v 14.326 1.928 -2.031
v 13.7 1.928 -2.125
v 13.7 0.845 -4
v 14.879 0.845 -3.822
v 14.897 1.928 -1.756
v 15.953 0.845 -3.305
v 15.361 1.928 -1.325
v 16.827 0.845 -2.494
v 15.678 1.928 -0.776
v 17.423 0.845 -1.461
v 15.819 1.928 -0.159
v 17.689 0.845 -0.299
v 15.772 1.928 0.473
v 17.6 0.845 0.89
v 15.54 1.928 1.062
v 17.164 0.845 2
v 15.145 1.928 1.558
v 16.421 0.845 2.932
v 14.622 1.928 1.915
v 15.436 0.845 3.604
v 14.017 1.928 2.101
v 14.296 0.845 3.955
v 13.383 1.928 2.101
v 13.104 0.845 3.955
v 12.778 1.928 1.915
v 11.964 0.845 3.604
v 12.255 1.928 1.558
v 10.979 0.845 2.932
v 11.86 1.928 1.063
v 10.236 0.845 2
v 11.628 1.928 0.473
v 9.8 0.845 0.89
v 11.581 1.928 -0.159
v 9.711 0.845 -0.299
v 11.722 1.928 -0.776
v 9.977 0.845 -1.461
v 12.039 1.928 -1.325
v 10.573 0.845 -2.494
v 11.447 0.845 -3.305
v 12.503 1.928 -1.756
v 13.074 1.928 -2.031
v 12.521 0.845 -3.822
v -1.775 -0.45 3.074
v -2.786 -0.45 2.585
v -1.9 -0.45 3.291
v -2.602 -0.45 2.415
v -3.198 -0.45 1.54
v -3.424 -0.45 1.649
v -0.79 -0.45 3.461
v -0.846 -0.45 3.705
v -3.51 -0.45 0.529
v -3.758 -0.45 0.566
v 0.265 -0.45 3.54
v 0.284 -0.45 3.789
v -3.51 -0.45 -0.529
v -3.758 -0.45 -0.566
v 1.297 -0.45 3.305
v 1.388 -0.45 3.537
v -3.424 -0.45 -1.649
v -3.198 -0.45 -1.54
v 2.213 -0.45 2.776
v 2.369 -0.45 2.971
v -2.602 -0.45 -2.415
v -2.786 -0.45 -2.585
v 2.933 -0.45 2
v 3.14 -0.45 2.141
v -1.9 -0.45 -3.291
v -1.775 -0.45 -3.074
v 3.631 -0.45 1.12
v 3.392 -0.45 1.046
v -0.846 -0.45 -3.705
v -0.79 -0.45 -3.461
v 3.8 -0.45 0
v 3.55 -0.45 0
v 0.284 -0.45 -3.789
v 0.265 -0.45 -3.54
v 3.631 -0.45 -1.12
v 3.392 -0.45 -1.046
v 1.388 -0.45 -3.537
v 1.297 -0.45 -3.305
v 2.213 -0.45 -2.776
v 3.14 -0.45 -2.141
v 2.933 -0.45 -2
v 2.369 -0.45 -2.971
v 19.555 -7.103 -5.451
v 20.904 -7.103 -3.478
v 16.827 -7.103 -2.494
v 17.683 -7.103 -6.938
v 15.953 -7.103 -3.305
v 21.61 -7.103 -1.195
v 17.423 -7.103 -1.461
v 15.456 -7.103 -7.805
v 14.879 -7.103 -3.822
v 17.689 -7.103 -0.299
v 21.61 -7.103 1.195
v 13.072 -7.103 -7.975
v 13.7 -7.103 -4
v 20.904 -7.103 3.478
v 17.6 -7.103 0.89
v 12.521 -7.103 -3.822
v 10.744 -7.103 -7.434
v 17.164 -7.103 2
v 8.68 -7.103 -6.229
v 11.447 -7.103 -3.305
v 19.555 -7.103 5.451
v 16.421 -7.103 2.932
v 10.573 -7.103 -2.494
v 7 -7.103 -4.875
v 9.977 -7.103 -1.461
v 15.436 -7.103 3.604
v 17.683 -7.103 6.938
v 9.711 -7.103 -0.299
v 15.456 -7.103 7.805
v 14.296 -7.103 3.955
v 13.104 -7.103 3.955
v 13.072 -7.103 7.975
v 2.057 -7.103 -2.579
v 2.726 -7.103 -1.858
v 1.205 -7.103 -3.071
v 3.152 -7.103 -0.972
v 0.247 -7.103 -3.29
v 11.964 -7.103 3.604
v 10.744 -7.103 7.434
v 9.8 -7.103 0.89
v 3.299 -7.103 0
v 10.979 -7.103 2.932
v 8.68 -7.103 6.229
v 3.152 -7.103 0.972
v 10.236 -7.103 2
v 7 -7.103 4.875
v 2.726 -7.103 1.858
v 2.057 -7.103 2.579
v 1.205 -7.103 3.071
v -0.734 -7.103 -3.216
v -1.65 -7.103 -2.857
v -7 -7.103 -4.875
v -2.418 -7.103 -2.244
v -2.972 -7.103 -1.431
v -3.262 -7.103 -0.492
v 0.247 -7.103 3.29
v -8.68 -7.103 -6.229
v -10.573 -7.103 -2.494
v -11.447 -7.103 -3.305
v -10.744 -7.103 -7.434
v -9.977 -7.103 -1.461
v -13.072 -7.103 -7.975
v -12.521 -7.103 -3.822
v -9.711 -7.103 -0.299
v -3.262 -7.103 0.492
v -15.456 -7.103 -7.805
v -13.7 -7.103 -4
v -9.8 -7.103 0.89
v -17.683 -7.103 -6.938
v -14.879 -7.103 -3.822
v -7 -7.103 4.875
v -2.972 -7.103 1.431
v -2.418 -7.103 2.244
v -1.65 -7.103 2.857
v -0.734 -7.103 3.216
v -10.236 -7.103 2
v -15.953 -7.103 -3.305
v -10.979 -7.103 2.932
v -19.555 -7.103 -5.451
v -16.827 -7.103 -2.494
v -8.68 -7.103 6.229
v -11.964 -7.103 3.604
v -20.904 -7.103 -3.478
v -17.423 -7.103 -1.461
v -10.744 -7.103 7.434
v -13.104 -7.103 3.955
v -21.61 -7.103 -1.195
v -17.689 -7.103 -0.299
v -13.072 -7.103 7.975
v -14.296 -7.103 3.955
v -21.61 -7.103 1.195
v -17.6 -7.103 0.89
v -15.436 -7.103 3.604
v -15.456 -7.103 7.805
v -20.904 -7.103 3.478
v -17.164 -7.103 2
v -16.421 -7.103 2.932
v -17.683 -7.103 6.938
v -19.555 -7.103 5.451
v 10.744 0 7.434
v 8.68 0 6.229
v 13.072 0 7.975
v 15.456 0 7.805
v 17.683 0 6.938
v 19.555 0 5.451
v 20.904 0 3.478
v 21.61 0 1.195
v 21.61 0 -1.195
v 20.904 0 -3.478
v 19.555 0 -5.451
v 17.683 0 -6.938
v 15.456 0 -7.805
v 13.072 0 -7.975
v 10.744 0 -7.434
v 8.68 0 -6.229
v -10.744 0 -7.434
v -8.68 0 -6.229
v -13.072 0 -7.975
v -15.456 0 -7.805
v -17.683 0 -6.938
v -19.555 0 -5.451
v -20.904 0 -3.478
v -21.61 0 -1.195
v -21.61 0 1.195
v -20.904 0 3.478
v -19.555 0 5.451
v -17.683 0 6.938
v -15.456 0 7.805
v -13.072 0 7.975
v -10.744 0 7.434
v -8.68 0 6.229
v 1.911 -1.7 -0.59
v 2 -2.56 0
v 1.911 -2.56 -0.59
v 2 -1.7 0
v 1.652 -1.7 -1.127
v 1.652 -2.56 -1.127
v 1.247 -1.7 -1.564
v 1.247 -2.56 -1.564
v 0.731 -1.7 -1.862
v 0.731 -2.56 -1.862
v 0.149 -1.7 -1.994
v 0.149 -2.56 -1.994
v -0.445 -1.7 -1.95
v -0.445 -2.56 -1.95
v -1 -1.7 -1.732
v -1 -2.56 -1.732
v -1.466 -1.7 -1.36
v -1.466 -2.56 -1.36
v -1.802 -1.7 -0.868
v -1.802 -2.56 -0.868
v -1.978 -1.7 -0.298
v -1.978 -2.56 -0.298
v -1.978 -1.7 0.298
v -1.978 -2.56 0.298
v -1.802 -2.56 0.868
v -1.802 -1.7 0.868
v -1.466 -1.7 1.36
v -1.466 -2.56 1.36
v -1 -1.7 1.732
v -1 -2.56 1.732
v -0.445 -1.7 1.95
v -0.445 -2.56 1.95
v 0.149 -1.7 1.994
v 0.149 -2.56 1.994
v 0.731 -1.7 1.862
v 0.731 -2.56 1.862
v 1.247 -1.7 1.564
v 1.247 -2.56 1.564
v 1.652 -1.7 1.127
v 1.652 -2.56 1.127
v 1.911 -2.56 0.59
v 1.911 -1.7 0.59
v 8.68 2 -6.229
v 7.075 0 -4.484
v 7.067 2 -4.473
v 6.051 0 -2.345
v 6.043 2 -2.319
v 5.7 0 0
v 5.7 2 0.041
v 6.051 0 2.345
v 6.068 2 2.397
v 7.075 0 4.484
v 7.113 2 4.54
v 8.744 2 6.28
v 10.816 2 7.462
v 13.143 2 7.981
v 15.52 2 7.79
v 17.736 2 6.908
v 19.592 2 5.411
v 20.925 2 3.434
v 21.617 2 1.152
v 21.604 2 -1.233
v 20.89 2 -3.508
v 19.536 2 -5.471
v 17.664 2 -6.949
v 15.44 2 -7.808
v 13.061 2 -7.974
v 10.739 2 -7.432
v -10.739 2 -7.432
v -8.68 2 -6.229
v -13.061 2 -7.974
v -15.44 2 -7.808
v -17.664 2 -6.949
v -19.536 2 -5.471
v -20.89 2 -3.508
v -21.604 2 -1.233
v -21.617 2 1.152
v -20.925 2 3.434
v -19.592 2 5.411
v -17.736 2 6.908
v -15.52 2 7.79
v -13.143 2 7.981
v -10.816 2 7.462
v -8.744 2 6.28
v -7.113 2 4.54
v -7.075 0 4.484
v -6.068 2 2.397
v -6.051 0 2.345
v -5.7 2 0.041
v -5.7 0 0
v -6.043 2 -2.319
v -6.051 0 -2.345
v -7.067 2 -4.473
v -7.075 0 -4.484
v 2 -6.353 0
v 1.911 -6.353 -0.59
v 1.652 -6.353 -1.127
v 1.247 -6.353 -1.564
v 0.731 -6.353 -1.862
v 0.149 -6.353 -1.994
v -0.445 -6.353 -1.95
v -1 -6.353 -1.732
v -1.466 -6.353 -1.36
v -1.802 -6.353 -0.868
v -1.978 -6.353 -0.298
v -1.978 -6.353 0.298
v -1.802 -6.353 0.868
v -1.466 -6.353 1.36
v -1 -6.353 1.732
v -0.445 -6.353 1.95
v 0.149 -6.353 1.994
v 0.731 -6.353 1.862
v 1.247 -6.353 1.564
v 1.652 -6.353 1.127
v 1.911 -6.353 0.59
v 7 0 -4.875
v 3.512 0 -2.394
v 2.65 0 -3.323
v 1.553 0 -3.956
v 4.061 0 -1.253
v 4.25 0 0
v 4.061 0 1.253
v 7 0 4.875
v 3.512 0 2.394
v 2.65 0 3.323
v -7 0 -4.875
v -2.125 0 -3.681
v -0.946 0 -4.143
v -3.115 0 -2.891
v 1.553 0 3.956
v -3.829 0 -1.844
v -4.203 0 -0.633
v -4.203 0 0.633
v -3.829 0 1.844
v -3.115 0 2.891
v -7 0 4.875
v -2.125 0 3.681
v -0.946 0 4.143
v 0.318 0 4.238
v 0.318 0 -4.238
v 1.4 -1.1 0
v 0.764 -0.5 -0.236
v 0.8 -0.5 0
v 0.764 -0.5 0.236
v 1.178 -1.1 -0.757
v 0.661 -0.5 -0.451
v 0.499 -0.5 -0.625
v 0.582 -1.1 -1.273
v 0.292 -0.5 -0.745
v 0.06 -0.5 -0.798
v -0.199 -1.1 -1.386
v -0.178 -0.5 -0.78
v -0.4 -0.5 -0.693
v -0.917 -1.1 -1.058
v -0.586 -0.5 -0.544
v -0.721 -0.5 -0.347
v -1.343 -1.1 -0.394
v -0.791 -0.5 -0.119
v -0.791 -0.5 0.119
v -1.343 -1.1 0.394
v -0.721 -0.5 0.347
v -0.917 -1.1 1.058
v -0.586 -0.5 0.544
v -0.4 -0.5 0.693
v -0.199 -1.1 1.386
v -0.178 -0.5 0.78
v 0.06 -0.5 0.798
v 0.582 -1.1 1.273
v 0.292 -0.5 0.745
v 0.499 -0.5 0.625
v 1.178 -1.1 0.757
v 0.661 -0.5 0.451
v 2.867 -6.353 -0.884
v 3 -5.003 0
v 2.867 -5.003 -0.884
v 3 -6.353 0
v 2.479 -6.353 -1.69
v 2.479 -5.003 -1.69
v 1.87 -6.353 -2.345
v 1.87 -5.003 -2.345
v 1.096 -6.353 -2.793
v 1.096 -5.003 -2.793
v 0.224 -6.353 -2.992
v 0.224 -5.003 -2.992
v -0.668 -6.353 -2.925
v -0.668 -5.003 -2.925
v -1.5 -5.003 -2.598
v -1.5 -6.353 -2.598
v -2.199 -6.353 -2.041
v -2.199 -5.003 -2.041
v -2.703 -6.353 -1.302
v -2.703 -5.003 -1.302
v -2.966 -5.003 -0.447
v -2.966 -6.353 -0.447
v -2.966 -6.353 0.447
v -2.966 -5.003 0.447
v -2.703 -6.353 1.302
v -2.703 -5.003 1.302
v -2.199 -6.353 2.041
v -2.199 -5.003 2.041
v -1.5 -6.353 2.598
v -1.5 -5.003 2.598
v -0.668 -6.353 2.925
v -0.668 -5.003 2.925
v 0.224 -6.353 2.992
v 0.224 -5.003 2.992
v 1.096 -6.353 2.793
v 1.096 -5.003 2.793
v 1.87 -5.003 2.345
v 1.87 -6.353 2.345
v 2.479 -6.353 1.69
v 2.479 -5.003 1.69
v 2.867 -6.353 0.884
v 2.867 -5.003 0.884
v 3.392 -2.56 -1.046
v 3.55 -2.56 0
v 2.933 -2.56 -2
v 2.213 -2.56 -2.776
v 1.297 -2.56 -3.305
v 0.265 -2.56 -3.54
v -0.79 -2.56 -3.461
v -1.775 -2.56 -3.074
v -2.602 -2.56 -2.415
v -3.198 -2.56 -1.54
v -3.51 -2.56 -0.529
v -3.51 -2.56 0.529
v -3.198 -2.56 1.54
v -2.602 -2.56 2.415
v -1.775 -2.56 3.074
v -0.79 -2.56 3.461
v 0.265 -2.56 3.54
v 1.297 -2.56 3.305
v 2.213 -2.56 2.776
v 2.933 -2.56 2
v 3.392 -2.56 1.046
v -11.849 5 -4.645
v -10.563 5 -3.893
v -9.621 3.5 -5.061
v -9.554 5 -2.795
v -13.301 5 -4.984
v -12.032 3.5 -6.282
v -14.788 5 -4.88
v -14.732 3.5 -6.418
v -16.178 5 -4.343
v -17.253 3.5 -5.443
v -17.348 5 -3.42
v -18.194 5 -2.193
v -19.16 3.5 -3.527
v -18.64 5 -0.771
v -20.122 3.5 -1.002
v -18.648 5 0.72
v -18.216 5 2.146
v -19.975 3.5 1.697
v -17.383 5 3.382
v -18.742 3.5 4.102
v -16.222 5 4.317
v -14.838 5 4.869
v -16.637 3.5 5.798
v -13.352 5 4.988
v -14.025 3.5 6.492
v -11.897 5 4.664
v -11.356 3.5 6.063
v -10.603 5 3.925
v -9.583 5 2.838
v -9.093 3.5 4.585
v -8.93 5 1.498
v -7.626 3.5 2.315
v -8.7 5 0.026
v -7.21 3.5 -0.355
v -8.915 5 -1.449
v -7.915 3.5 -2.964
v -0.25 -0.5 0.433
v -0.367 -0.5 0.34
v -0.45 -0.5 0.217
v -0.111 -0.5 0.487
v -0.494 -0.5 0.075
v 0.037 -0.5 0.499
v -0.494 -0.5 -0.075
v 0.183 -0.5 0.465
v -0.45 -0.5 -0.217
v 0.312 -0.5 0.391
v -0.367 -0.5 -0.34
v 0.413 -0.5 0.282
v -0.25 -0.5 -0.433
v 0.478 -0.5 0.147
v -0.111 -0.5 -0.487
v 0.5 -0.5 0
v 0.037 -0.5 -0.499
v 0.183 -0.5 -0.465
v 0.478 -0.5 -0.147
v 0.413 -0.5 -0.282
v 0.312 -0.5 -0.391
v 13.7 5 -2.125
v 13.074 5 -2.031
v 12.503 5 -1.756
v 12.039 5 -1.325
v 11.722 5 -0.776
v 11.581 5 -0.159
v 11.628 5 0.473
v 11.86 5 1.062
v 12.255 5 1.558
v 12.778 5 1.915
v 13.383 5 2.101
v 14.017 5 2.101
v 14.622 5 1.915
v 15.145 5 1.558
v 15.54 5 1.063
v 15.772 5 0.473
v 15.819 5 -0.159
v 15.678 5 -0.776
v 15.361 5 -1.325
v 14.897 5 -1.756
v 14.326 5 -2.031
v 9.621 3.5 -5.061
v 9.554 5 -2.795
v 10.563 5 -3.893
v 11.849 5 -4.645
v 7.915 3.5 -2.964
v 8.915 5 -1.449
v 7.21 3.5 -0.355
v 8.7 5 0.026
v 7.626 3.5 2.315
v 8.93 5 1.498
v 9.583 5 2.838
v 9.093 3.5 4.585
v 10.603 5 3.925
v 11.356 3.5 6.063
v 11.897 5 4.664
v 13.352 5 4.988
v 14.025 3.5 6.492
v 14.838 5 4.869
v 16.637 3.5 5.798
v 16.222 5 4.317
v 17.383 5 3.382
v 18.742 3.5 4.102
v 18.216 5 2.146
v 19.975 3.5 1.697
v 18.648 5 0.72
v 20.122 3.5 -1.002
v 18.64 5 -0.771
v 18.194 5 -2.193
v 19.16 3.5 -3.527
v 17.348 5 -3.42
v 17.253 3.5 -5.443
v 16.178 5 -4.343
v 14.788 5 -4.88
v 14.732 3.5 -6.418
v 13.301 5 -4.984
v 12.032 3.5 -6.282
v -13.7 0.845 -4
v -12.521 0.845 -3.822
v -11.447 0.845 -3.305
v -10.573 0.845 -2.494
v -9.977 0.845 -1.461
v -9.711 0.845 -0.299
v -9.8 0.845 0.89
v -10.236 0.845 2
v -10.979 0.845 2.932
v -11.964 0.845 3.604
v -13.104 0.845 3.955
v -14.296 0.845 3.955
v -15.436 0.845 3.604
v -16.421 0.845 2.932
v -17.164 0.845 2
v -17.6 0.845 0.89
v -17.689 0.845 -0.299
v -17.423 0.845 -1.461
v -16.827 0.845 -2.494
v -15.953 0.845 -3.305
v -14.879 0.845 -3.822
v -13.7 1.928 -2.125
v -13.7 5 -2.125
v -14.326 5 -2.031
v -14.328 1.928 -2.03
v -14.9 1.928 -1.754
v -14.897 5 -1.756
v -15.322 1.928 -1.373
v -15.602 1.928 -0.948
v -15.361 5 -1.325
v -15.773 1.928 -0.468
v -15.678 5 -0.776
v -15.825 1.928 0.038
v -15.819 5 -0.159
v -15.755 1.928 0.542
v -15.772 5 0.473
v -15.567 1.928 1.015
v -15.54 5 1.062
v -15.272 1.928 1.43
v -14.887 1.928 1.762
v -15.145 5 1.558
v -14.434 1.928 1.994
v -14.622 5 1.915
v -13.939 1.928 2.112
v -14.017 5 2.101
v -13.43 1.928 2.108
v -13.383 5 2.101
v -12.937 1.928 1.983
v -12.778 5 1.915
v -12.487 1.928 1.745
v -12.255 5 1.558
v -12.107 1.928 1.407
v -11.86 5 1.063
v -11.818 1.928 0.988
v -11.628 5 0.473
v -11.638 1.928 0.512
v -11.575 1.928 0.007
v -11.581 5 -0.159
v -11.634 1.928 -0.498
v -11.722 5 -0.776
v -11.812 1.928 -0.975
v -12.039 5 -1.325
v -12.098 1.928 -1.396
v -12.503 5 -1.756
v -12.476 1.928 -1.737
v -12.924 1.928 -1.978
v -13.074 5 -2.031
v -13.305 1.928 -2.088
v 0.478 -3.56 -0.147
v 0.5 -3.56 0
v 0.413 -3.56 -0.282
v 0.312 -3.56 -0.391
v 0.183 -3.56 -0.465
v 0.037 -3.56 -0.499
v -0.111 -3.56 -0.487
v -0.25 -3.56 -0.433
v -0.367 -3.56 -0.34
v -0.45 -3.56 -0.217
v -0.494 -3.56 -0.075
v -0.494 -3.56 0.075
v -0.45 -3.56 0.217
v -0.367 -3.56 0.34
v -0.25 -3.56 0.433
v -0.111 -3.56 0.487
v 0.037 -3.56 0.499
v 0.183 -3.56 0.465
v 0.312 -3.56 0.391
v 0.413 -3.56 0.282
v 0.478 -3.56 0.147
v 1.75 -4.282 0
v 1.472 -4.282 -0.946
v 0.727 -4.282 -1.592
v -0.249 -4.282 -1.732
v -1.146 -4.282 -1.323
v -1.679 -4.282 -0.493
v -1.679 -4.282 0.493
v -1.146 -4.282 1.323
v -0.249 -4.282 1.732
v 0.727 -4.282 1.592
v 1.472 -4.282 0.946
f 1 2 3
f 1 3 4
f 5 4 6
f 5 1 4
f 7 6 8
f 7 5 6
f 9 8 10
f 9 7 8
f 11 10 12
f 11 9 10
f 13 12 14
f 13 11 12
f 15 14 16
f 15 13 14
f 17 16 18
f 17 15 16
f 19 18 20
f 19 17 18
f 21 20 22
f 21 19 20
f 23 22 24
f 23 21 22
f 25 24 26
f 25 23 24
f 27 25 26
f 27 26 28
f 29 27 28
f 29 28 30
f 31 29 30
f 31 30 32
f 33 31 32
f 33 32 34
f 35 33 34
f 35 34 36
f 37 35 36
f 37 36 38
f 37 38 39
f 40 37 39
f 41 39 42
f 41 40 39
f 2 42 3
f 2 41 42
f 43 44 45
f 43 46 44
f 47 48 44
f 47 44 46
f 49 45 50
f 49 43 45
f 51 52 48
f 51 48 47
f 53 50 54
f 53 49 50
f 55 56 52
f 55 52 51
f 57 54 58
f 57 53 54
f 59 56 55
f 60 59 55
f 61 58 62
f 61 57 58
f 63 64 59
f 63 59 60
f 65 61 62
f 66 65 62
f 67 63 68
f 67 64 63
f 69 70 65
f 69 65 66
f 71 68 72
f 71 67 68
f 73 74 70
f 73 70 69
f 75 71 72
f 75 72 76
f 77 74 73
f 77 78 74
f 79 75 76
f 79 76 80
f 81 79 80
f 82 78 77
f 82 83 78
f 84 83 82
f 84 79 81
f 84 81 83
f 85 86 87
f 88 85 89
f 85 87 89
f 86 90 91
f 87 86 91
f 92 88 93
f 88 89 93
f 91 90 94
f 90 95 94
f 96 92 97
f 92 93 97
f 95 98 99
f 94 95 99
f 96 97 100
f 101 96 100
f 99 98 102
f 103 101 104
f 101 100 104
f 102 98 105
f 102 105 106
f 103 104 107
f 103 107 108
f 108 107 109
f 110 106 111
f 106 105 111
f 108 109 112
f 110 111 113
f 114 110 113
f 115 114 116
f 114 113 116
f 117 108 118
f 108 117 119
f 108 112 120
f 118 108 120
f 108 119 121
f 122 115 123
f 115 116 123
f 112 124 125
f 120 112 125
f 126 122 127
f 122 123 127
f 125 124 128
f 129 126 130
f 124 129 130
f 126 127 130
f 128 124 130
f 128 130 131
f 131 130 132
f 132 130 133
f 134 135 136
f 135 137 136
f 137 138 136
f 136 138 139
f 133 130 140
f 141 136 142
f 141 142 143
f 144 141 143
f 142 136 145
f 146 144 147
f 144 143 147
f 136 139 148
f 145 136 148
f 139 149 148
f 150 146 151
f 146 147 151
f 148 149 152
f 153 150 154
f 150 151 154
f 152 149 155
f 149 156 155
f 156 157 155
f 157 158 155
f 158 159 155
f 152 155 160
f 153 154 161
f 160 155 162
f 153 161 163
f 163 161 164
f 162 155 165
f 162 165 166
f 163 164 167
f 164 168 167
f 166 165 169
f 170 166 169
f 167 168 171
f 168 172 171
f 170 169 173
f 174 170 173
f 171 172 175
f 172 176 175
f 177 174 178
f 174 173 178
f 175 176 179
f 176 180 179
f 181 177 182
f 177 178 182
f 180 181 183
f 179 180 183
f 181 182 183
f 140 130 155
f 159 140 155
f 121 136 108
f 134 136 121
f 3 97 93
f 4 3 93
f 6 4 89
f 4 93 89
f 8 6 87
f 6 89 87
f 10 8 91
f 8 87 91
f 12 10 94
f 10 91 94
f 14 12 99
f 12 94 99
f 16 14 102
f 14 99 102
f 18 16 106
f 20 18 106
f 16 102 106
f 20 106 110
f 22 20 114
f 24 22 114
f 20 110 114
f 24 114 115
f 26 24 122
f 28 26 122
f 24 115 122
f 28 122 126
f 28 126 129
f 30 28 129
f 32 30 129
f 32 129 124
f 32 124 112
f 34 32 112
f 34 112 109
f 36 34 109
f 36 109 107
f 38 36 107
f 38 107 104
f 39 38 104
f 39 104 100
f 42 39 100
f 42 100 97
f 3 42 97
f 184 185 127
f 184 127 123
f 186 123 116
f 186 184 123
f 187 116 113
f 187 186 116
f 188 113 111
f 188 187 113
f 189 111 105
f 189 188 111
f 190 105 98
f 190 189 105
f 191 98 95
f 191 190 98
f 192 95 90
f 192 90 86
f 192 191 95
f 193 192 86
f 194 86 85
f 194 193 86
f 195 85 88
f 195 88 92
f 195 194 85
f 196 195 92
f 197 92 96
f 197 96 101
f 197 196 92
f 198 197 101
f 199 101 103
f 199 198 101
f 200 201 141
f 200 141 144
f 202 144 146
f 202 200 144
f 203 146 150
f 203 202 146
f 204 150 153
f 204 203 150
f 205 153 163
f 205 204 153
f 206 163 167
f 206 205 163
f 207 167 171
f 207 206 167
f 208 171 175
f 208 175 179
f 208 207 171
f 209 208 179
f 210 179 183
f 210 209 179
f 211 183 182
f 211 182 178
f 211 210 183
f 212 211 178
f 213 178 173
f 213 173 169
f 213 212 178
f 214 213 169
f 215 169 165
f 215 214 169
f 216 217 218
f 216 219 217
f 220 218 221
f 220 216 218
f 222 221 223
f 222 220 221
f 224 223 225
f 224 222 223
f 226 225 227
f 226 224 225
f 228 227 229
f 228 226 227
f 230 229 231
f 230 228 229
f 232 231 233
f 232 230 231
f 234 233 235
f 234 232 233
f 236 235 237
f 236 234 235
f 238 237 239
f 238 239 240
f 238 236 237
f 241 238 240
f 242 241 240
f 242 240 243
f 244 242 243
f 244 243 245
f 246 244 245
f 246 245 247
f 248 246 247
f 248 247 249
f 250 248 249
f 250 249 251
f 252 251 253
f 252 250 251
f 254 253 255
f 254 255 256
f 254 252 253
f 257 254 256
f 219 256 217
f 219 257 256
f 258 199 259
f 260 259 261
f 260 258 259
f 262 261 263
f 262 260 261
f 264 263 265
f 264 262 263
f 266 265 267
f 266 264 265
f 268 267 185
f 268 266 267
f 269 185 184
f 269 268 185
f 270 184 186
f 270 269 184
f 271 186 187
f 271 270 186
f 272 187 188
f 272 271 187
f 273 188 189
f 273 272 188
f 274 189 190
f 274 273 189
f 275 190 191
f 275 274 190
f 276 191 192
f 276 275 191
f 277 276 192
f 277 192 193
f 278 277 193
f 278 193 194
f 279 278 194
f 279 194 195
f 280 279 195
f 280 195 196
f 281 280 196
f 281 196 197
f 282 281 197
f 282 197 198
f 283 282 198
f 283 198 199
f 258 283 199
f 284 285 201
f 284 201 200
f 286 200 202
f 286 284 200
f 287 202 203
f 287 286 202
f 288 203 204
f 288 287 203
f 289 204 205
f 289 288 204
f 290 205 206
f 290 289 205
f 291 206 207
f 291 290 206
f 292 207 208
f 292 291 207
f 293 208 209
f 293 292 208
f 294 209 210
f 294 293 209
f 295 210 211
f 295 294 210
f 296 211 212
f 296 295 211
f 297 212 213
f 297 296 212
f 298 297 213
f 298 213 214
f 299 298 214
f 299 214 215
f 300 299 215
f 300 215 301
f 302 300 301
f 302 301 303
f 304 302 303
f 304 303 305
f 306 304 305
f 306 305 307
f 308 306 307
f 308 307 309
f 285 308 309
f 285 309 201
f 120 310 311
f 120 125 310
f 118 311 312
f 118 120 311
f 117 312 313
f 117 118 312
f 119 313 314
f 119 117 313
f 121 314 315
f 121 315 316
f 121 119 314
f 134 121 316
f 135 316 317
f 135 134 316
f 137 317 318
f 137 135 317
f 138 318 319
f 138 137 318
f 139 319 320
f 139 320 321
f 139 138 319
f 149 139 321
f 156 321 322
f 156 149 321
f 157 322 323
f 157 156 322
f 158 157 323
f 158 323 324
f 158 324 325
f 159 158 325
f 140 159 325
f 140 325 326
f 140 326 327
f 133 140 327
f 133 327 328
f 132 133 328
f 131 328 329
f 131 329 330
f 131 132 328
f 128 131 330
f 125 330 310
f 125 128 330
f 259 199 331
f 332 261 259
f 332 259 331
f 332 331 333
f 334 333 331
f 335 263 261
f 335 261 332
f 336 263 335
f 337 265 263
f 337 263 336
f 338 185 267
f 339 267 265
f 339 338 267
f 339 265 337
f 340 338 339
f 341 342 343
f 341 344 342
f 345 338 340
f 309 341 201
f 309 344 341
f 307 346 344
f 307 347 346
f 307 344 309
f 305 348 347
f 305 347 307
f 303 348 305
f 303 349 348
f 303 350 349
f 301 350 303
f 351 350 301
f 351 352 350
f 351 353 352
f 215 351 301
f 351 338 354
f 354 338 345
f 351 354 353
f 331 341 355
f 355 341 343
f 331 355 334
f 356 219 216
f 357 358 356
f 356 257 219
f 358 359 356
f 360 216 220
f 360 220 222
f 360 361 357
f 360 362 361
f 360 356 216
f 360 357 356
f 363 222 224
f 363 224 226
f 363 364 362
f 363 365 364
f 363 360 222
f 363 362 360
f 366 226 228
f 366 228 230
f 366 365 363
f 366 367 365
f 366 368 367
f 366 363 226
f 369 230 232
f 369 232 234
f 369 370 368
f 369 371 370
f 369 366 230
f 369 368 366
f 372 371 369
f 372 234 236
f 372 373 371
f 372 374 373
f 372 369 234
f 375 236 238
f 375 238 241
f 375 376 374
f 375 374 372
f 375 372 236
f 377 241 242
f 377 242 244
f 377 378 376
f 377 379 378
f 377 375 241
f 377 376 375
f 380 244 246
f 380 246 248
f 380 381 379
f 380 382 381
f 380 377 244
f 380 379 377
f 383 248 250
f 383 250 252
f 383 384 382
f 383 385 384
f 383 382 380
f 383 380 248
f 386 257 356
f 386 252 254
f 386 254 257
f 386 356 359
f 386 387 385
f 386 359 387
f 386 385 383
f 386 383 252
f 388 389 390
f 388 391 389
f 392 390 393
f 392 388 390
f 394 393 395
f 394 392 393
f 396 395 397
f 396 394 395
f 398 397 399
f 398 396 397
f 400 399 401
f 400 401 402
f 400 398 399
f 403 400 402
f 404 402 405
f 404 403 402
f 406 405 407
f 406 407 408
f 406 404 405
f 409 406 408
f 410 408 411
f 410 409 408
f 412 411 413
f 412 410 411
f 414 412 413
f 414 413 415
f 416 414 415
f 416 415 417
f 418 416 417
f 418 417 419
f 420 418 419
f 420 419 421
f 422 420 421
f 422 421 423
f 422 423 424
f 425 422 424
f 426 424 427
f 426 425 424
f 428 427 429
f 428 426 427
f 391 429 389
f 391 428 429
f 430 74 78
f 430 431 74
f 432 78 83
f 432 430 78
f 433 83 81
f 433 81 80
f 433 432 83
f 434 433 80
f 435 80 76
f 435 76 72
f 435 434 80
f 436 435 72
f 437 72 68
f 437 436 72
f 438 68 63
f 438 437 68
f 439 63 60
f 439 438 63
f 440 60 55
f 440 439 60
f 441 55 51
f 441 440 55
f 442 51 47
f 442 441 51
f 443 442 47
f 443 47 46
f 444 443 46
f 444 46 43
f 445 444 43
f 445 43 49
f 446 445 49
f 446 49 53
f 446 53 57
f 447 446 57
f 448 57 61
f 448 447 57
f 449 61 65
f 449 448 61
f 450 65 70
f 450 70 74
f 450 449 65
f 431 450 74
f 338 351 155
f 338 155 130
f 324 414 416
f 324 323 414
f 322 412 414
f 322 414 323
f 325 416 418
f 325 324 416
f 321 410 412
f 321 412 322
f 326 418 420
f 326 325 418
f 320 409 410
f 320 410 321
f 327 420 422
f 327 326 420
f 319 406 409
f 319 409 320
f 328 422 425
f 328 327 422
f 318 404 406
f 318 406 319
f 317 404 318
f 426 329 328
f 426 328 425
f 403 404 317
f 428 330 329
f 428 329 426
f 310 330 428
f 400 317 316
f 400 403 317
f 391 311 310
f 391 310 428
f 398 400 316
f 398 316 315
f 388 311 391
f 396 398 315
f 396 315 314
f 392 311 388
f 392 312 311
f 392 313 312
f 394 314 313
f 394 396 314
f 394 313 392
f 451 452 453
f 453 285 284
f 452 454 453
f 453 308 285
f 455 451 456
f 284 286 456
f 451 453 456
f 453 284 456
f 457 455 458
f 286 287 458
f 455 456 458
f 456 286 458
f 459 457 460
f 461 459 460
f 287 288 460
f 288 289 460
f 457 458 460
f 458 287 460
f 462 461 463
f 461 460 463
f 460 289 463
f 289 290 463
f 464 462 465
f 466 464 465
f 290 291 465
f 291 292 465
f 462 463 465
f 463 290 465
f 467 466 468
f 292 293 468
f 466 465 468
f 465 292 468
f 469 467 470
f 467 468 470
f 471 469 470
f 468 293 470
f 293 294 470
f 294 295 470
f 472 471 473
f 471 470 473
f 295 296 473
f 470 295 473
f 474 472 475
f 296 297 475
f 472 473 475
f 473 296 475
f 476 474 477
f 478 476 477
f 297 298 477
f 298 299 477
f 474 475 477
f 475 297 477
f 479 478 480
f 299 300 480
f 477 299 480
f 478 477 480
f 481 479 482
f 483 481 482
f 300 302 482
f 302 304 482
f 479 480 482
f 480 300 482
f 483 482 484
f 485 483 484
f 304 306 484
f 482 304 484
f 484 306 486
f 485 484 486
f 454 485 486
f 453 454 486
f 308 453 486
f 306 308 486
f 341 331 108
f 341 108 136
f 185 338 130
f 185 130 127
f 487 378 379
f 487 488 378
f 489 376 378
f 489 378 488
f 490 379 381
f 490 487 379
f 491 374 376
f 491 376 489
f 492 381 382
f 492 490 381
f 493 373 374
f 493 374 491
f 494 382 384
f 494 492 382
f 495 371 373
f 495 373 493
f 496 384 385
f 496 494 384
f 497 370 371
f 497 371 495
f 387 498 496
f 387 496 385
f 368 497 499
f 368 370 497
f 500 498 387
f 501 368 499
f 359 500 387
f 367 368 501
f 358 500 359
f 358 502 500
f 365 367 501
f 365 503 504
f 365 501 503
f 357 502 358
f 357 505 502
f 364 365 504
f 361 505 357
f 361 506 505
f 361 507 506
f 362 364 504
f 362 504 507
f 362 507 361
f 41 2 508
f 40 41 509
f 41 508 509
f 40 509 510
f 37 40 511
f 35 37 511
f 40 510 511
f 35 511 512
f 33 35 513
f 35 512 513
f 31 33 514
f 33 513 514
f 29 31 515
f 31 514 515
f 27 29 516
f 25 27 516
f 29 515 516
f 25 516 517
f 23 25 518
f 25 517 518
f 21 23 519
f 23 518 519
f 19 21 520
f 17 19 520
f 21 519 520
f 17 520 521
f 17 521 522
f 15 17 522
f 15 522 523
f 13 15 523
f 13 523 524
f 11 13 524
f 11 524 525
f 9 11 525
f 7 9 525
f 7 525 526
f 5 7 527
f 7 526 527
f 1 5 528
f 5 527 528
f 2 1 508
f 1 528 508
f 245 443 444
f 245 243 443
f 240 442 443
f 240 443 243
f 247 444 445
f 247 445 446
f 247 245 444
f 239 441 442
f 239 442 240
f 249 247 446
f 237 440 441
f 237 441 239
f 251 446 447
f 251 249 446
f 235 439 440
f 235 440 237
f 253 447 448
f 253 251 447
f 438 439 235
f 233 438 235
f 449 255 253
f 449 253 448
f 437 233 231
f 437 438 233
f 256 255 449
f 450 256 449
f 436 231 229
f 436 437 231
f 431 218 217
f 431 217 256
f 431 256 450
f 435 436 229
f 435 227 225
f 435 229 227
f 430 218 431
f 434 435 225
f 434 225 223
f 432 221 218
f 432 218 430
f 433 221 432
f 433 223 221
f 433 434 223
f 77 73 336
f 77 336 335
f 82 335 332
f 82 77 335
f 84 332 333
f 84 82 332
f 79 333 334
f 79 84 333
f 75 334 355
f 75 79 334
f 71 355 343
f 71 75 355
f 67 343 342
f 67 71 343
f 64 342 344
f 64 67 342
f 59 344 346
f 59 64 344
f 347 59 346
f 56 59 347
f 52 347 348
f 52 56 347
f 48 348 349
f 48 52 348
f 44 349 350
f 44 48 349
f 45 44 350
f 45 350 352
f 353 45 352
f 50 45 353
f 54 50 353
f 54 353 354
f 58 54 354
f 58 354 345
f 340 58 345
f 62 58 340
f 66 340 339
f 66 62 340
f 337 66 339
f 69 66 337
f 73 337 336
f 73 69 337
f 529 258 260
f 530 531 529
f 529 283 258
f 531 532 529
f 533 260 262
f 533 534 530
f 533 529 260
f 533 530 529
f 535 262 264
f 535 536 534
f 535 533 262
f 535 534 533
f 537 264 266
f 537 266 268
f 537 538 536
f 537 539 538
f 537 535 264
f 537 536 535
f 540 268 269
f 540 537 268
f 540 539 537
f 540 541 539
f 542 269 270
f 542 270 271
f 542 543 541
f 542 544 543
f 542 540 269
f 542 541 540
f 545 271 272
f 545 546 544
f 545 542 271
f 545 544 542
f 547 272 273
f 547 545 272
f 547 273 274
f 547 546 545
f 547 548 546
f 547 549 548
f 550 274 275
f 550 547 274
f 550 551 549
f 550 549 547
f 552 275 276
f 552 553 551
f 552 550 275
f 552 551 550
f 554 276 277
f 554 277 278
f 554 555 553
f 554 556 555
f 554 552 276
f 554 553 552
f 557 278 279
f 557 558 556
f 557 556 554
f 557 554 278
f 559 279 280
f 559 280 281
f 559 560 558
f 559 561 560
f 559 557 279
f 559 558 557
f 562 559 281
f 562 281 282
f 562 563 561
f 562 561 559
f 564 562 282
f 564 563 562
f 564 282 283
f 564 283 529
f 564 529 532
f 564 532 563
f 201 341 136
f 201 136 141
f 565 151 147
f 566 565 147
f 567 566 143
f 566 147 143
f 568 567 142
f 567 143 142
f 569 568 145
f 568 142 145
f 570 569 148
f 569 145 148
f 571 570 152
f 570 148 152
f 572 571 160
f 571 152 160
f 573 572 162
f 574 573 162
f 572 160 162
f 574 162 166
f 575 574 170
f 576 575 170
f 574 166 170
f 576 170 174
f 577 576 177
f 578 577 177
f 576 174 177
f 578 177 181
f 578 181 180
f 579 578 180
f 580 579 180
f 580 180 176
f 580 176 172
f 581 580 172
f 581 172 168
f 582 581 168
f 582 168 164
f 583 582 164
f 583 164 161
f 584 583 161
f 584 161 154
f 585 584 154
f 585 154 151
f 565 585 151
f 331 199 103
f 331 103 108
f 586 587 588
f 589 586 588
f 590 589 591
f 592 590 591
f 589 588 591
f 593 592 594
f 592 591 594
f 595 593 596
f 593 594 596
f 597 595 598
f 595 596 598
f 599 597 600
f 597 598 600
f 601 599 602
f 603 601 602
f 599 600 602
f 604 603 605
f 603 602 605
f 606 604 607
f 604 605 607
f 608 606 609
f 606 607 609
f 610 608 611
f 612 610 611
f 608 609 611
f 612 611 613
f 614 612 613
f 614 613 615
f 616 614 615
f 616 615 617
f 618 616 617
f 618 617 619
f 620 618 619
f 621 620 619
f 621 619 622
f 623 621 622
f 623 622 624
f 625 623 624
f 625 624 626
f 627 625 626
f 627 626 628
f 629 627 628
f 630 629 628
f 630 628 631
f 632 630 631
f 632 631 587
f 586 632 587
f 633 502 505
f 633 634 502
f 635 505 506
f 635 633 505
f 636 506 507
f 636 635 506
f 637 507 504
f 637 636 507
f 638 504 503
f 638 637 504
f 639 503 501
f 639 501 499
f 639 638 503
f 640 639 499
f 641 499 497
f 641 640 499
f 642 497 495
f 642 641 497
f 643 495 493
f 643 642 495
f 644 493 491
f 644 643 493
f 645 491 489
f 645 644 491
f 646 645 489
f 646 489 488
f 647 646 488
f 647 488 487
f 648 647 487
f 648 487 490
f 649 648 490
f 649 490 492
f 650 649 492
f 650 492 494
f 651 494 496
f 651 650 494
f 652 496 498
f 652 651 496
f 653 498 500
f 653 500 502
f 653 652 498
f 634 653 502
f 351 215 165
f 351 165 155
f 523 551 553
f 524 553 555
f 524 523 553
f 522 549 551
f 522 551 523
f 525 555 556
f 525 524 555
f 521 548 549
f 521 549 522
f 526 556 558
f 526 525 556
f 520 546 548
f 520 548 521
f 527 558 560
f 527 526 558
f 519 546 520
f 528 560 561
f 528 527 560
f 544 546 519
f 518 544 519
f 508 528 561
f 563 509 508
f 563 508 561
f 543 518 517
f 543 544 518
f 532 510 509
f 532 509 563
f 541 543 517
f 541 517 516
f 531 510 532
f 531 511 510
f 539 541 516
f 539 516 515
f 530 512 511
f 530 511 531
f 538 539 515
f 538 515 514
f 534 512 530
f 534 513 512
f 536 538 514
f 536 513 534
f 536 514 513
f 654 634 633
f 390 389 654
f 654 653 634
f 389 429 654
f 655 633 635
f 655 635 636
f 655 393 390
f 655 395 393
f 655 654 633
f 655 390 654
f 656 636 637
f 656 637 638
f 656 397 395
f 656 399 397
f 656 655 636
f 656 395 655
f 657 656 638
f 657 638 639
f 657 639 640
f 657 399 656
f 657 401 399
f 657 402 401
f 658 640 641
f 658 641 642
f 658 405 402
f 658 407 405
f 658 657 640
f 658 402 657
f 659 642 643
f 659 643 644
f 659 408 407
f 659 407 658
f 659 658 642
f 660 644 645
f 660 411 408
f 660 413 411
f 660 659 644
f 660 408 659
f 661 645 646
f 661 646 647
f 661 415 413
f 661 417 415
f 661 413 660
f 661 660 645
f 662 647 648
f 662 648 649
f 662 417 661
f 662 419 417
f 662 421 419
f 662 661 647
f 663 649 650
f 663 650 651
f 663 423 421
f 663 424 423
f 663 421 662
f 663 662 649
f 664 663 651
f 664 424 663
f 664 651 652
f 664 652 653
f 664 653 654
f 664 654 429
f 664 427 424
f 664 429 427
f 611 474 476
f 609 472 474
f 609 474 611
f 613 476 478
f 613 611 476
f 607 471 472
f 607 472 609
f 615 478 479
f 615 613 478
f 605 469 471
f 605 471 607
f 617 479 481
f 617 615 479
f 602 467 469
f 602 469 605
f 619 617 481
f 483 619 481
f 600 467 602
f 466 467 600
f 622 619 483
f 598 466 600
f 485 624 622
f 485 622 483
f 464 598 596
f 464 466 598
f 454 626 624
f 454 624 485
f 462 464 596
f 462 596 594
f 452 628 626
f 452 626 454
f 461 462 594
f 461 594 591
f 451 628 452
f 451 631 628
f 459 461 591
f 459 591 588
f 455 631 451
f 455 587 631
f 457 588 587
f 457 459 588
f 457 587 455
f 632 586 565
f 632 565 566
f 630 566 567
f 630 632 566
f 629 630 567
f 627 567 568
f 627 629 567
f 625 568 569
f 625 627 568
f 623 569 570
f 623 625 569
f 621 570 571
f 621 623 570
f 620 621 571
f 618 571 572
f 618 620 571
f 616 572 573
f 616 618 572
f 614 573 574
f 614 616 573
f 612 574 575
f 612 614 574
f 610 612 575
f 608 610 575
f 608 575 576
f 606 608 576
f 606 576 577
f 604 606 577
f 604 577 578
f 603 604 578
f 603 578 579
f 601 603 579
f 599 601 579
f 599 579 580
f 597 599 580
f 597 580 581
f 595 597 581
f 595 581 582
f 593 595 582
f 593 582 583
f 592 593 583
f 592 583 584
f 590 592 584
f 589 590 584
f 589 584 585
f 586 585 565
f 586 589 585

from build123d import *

# Parameters (mm, degrees)
BOSS_EXTRUDE3_START = -7.103375673
SKETCH4_R           = 2.125
SKETCH4_R_2         = 4.25
BOSS_EXTRUDE3_DEPTH = 7.103375673
BOSS_EXTRUDE4_START = 5
SKETCH6_R           = 8
SKETCH6_R_2         = 2.125
BOSS_EXTRUDE4_DEPTH = 5
SKETCH5_R           = 4
CUT_EXTRUDE2_DEPTH  = 9.103375673
CHAMFER2_SIZE       = 1.154700538
CHAMFER2_SIZE_2     = 2
CHAMFER3_SIZE       = 3


# Read off the part's stored shape, not the designer's step: Revolve1
with BuildPart() as part:
    # Revolve1 outline → Revolve1 (revolve)
    with BuildSketch(Plane.XY):
        Polygon((4.25, 0), (3.8, -0.45), (3.55, -0.45), (3.55, -2.56), (2, -2.56), (2, -1.7), (0.8, -0.5), (0.5, -0.5), (0.5, -3.56), (3, -5.003375673), (3, -6.353375673), (2, -6.353375673), (3.299038106, -7.103375673), (4.25, -7.103375673), align=None)
    revolve(axis=Axis((0, 0, 0), (0, 1, 0)))

    # Sketch4 → Boss-Extrude3 (add)
    with BuildSketch(Plane.XZ.offset(7.103375673).offset(BOSS_EXTRUDE3_START)):
        with BuildLine():
            Line((-7, 4.875), (7, 4.875))
            Line((7, 4.875), (8.680016564, 6.228945842))
            ThreePointArc((8.680016564, 6.228945842), (21.7, 0), (8.680016564, -6.228945842))
            Line((8.680016564, -6.228945842), (7, -4.875))
            Line((7, -4.875), (-7, -4.875))
            Line((-7, -4.875), (-8.680016564, -6.228945842))
            ThreePointArc((-8.680016564, -6.228945842), (-21.7, 0), (-8.680016564, 6.228945842))
            Line((-8.680016564, 6.228945842), (-7, 4.875))
        make_face()
        with Locations(Location((-13.7, 0, 0), (0, 0, 270))):
            Circle(SKETCH4_R, mode=Mode.SUBTRACT)
        with Locations(Location((13.7, 0, 0), (0, 0, 270))):
            Circle(SKETCH4_R, mode=Mode.SUBTRACT)
        Circle(SKETCH4_R_2, mode=Mode.SUBTRACT)
    extrude(amount=BOSS_EXTRUDE3_DEPTH)

    # Sketch6 → Boss-Extrude4 (add)
    # profile 1 of 2: a face of its own
    with BuildSketch(Plane(origin=(0, 0, 0), x_dir=(1, 0, 0), z_dir=(0, 1, 0)).offset(BOSS_EXTRUDE4_START)):
        with Locations(Location((-13.7, 0, 0), (0, 0, 51.134235394))):
            Circle(SKETCH6_R)
        with Locations(Location((-13.7, 0, 0), (0, 0, 90))):
            Circle(SKETCH6_R_2, mode=Mode.SUBTRACT)
    # profile 2 of 2: a face of its own
    with BuildSketch(Plane(origin=(0, 0, 0), x_dir=(1, 0, 0), z_dir=(0, 1, 0)).offset(BOSS_EXTRUDE4_START)):
        with Locations(Location((13.7, 0, 0), (0, 0, 128.865764606))):
            Circle(SKETCH6_R)
        with Locations(Location((13.7, 0, 0), (0, 0, 90))):
            Circle(SKETCH6_R_2, mode=Mode.SUBTRACT)
    extrude(amount=-BOSS_EXTRUDE4_DEPTH)

    # Sketch5 → Cut-Extrude2 (cut)
    with BuildSketch(Plane.XZ.offset(7.103375673)):
        with Locations(Location((-13.699999648, 0, 0), (0, 0, 270))):
            Circle(SKETCH5_R)
        with Locations(Location((13.7, 0, 0), (0, 0, 270))):
            Circle(SKETCH5_R)
    extrude(amount=-CUT_EXTRUDE2_DEPTH, mode=Mode.SUBTRACT)

    # Chamfer2
    # the kernel refuses this chamfer: 2, 1.154700538 mm, written as the material it adds along each edge
    with BuildSketch(Plane(origin=(-13.699999648, 2, 0), x_dir=(0, 0, -1), z_dir=(-1, 0, 0))) as chamfer2_piece_1_section:
        Polygon((4, CHAMFER2_SIZE), (4 - CHAMFER2_SIZE_2, 0), (4, 0), align=None)
    chamfer2_piece_1 = revolve(axis=Axis((-13.699999648, 2, 0), (0, -1, 0)), mode=Mode.PRIVATE)
    chamfer2_piece_1 = chamfer2_piece_1 - Plane(origin=(-13.7, 1.411589212, 0), x_dir=(0, 0, -1), z_dir=(0, 1, 0)) * Cylinder(2.125, 17, mode=Mode.PRIVATE)
    add(chamfer2_piece_1)
    with BuildSketch(Plane(origin=(13.7, 2, 0), x_dir=(0, 0, -1), z_dir=(-1, 0, 0))) as chamfer2_piece_2_section:
        Polygon((4, CHAMFER2_SIZE), (4 - CHAMFER2_SIZE_2, 0), (4, 0), align=None)
    chamfer2_piece_2 = revolve(axis=Axis((13.7, 2, 0), (0, -1, 0)), mode=Mode.PRIVATE)
    chamfer2_piece_2 = chamfer2_piece_2 - Plane(origin=(13.7, 1.41158911, 0), x_dir=(0, 0, -1), z_dir=(0, 1, 0)) * Cylinder(2.125, 16, mode=Mode.PRIVATE)
    add(chamfer2_piece_2)

    # Chamfer3
    chamfer3_edges = [part.edges().sort_by_distance(p)[0] for p in [
        (-18.719983436, 5, 6.228945842),
        (18.719983436, 5, 6.228945842),
    ]]
    chamfer(chamfer3_edges, length=CHAMFER3_SIZE)


solid = part.part
